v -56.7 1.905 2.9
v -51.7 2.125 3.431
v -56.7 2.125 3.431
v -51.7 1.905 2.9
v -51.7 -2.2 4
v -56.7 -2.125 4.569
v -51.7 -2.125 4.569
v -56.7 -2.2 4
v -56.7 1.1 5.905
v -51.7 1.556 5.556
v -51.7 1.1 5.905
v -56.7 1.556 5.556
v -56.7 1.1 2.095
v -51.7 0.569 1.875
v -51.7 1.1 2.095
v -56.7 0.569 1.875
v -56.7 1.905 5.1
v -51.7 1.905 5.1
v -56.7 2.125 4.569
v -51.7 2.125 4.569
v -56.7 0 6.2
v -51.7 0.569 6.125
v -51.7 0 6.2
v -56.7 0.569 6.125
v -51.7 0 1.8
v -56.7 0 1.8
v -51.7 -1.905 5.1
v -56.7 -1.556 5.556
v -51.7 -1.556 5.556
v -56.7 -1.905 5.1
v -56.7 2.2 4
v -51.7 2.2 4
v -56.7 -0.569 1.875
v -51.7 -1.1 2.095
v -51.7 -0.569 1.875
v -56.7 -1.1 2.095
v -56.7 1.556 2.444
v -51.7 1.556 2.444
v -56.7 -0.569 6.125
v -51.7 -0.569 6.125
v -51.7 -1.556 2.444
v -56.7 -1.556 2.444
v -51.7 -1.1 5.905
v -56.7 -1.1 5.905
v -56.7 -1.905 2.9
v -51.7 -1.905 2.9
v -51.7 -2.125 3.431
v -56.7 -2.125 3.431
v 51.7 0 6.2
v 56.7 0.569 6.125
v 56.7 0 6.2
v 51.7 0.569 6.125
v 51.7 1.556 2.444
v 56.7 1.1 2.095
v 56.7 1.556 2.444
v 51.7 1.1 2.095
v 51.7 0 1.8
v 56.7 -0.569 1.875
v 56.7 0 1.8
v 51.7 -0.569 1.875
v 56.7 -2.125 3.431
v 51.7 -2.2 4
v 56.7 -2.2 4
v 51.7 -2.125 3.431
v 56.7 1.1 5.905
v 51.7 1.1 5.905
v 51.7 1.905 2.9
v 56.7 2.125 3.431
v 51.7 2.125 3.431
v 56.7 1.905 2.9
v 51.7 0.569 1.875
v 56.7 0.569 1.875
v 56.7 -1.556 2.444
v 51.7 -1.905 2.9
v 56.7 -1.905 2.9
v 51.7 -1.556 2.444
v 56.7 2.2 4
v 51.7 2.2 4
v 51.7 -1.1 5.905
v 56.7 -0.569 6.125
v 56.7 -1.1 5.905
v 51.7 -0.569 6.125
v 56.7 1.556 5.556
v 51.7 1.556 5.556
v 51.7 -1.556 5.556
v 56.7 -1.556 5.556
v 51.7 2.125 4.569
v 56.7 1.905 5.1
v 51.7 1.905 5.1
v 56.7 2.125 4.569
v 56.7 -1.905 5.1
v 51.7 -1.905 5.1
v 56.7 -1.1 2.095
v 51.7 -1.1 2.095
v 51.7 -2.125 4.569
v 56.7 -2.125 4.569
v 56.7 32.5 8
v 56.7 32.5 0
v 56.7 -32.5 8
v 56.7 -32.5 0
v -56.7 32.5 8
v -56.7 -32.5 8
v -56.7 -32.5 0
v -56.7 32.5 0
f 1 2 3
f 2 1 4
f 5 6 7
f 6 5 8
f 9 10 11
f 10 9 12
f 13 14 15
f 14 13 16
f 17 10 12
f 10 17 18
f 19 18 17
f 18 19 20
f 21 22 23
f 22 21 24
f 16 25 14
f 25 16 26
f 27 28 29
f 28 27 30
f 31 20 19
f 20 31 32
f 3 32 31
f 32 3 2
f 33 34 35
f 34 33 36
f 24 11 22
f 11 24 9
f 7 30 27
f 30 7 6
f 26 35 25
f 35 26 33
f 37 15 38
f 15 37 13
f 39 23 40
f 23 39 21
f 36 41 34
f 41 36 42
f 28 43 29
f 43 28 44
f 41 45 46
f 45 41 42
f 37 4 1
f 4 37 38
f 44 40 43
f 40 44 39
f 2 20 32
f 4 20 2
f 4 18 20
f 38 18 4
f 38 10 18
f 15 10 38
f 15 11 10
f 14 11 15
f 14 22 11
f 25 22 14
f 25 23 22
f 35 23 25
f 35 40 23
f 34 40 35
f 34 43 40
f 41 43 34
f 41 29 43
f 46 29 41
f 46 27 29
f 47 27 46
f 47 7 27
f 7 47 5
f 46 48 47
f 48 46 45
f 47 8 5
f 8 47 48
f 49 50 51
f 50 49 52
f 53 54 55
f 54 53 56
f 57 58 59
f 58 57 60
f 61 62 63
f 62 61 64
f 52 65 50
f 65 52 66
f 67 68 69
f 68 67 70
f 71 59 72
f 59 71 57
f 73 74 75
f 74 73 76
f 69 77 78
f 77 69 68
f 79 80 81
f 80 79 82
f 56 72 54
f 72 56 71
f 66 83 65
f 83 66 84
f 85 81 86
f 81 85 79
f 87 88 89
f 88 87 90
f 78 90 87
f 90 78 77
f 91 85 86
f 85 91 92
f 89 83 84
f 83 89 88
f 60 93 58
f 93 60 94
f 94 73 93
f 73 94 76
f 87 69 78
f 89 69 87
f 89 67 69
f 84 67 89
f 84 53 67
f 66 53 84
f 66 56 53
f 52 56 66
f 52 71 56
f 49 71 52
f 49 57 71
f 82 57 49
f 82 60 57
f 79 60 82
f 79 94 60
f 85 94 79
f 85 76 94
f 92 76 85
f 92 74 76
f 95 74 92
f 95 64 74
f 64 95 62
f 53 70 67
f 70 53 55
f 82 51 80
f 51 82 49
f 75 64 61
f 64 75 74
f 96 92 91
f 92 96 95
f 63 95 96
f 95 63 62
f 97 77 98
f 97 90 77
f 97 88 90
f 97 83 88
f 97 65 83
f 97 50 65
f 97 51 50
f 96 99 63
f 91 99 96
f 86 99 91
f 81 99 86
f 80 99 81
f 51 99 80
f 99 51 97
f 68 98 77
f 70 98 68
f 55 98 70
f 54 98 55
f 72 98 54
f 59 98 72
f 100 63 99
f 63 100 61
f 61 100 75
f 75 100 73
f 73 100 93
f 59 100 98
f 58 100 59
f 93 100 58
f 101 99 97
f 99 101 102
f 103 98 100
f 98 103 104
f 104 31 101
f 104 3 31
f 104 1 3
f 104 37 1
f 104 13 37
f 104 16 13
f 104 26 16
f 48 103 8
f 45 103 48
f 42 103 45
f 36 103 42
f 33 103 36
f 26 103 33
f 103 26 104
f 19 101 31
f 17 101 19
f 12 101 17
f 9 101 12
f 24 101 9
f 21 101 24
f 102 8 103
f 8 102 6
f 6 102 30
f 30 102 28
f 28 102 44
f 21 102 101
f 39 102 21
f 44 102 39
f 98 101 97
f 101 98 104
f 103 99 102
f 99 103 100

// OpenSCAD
// file: ../../heat_insert/heat_insert.scad
// Heat-Set Insert Library
// ヒートセットインサート用穴生成ライブラリ
//
// 提供モジュール:
//   insert_hole(size, length, tolerance, extra_depth)
//   m2_insert_hole(), m2p5_insert_hole(), m3_insert_hole()
//
// 対応サイズ: M2, M2.5, M3
// 参考: CNC Kitchen specifications
//       https://www.cnckitchen.com/blog/tipps-amp-tricks-fr-gewindeeinstze-im-3d-druck-3awey
//
// 使用例:
//   difference() {
//       cylinder(h = 10, d = 8, $fn = 24);  // ボス
//       translate([0, 0, 10])
//           insert_hole("M3");              // インサート穴
//   }

// ===== ヒートセットインサート寸法テーブル =====
// [外径, 推奨穴径, 長さ]

function m2_insert_table(length) =
    length == "short"    ? [3.6, 3.2, 3.0] :
    length == "standard" ? [3.6, 3.2, 3.0] :
    is_num(length) ? [3.6, 3.2, length] :
    undef;

function m2p5_insert_table(length) =
    length == "short"    ? [4.6, 4.0, 4.0] :
    length == "standard" ? [4.6, 4.0, 4.0] :
    length == "long"     ? [5.0, 4.0, 5.7] :
    is_num(length) ? [4.6, 4.0, length] :
    undef;

function m3_insert_table(length) =
    length == "short"    ? [4.6, 4.0, 3.0] :
    length == "standard" ? [4.6, 4.4, 4.0] :
    length == "long"     ? [5.0, 4.0, 5.7] :
    is_num(length) ? [4.6, 4.2, length] :
    undef;

// 統合ルックアップ関数
// 戻り値: [外径, 穴径, 長さ]
function insert_specs(size, length = "standard") =
    size == "M2"   ? m2_insert_table(length) :
    size == "M2.5" ? m2p5_insert_table(length) :
    size == "M3"   ? m3_insert_table(length) :
    undef;

// ボス径の推奨値（インサート外径 + 肉厚 * 2）
function insert_boss_d(size, wall = 2) =
    let(specs = insert_specs(size))
    is_undef(specs) ? 0 : specs[0] + wall * 2;

// ===== モジュール =====

// インサート穴（difference用）
// 原点はボス上面、穴は下方向（-Z）に掘る
module insert_hole(size = "M3", length = "standard", tolerance = 0, extra_depth = 1) {
    specs = insert_specs(size, length);

    if (is_undef(specs)) {
        echo(str("ERROR: Invalid insert size '", size, "' or length '", length, "'"));
    } else {
        hole_d = specs[1] + tolerance;
        insert_length = specs[2];
        total_depth = insert_length + extra_depth;

        // 穴を掘る（上面から下へ、Z-fighting回避のため+0.1）
        translate([0, 0, -total_depth])
            cylinder(h = total_depth + 0.1, d = hole_d, $fn = 24);
    }
}

// M2専用
module m2_insert_hole(length = "standard", tolerance = 0, extra_depth = 1) {
    insert_hole("M2", length, tolerance, extra_depth);
}

// M2.5専用
module m2p5_insert_hole(length = "standard", tolerance = 0, extra_depth = 1) {
    insert_hole("M2.5", length, tolerance, extra_depth);
}

// M3専用
module m3_insert_hole(length = "standard", tolerance = 0, extra_depth = 1) {
    insert_hole("M3", length, tolerance, extra_depth);
}
// main file
// 拡張トップ基板マウント
// expansion_top 内部に配置し、壁外側からネジで固定する
//
// 外形: 梁 113.4mm x 65mm x 8mm（インサート穴内蔵）
// 取付: 壁内側のレッジに載せ、外側からネジで固定
// 使用ネジ: M3 x 8mm（左右各1本）
// 固定: 側面にヒートインサート埋込、壁外側からネジ
//
// ビルド:
//   openscad -o exp_top_pcb_mount.stl exp_top_pcb_mount.scad

use <../../heat_insert/heat_insert.scad>

// ===== パラメータ =====
// expansion_top.scad と同じ値を使用

// 外形寸法（expansion_top から参照）
exp_top_width = 120;
exp_top_wall = 3;

// マウントパラメータ
pcb_mount_width = 65;           // マウントの幅（Y方向）
pcb_mount_thickness = 8;        // マウントの厚さ（Z方向）- インサート穴を収容

// マウント本体の長さ（内壁間 - クリアランス）
pcb_mount_clearance = 0.3;      // クリアランス
mount_length = exp_top_width - exp_top_wall * 2 - pcb_mount_clearance * 2;

// ===== モジュール =====

// マウント本体（インサート穴内蔵）
module exp_top_pcb_mount_beam() {
    difference() {
        // マウント本体
        cube([mount_length, pcb_mount_width, pcb_mount_thickness], center=true);

        // インサート穴（X方向、側面から板内に収容）
        // insert_hole は原点から -Z 方向に掘る
        // rotate([0, ±90, 0]) で X 方向に向ける
        for (side = [-1, 1]) {
            translate([side * mount_length/2, 0, 0])
                rotate([0, side * 90, 0])
                    m3_insert_hole(length = "standard", extra_depth = 1);
        }
    }
}

// ===== 出力 =====
// 印刷しやすいよう Z=0 に配置（マウントの底面が印刷ベッド）
translate([0, 0, pcb_mount_thickness/2])
    exp_top_pcb_mount_beam();
